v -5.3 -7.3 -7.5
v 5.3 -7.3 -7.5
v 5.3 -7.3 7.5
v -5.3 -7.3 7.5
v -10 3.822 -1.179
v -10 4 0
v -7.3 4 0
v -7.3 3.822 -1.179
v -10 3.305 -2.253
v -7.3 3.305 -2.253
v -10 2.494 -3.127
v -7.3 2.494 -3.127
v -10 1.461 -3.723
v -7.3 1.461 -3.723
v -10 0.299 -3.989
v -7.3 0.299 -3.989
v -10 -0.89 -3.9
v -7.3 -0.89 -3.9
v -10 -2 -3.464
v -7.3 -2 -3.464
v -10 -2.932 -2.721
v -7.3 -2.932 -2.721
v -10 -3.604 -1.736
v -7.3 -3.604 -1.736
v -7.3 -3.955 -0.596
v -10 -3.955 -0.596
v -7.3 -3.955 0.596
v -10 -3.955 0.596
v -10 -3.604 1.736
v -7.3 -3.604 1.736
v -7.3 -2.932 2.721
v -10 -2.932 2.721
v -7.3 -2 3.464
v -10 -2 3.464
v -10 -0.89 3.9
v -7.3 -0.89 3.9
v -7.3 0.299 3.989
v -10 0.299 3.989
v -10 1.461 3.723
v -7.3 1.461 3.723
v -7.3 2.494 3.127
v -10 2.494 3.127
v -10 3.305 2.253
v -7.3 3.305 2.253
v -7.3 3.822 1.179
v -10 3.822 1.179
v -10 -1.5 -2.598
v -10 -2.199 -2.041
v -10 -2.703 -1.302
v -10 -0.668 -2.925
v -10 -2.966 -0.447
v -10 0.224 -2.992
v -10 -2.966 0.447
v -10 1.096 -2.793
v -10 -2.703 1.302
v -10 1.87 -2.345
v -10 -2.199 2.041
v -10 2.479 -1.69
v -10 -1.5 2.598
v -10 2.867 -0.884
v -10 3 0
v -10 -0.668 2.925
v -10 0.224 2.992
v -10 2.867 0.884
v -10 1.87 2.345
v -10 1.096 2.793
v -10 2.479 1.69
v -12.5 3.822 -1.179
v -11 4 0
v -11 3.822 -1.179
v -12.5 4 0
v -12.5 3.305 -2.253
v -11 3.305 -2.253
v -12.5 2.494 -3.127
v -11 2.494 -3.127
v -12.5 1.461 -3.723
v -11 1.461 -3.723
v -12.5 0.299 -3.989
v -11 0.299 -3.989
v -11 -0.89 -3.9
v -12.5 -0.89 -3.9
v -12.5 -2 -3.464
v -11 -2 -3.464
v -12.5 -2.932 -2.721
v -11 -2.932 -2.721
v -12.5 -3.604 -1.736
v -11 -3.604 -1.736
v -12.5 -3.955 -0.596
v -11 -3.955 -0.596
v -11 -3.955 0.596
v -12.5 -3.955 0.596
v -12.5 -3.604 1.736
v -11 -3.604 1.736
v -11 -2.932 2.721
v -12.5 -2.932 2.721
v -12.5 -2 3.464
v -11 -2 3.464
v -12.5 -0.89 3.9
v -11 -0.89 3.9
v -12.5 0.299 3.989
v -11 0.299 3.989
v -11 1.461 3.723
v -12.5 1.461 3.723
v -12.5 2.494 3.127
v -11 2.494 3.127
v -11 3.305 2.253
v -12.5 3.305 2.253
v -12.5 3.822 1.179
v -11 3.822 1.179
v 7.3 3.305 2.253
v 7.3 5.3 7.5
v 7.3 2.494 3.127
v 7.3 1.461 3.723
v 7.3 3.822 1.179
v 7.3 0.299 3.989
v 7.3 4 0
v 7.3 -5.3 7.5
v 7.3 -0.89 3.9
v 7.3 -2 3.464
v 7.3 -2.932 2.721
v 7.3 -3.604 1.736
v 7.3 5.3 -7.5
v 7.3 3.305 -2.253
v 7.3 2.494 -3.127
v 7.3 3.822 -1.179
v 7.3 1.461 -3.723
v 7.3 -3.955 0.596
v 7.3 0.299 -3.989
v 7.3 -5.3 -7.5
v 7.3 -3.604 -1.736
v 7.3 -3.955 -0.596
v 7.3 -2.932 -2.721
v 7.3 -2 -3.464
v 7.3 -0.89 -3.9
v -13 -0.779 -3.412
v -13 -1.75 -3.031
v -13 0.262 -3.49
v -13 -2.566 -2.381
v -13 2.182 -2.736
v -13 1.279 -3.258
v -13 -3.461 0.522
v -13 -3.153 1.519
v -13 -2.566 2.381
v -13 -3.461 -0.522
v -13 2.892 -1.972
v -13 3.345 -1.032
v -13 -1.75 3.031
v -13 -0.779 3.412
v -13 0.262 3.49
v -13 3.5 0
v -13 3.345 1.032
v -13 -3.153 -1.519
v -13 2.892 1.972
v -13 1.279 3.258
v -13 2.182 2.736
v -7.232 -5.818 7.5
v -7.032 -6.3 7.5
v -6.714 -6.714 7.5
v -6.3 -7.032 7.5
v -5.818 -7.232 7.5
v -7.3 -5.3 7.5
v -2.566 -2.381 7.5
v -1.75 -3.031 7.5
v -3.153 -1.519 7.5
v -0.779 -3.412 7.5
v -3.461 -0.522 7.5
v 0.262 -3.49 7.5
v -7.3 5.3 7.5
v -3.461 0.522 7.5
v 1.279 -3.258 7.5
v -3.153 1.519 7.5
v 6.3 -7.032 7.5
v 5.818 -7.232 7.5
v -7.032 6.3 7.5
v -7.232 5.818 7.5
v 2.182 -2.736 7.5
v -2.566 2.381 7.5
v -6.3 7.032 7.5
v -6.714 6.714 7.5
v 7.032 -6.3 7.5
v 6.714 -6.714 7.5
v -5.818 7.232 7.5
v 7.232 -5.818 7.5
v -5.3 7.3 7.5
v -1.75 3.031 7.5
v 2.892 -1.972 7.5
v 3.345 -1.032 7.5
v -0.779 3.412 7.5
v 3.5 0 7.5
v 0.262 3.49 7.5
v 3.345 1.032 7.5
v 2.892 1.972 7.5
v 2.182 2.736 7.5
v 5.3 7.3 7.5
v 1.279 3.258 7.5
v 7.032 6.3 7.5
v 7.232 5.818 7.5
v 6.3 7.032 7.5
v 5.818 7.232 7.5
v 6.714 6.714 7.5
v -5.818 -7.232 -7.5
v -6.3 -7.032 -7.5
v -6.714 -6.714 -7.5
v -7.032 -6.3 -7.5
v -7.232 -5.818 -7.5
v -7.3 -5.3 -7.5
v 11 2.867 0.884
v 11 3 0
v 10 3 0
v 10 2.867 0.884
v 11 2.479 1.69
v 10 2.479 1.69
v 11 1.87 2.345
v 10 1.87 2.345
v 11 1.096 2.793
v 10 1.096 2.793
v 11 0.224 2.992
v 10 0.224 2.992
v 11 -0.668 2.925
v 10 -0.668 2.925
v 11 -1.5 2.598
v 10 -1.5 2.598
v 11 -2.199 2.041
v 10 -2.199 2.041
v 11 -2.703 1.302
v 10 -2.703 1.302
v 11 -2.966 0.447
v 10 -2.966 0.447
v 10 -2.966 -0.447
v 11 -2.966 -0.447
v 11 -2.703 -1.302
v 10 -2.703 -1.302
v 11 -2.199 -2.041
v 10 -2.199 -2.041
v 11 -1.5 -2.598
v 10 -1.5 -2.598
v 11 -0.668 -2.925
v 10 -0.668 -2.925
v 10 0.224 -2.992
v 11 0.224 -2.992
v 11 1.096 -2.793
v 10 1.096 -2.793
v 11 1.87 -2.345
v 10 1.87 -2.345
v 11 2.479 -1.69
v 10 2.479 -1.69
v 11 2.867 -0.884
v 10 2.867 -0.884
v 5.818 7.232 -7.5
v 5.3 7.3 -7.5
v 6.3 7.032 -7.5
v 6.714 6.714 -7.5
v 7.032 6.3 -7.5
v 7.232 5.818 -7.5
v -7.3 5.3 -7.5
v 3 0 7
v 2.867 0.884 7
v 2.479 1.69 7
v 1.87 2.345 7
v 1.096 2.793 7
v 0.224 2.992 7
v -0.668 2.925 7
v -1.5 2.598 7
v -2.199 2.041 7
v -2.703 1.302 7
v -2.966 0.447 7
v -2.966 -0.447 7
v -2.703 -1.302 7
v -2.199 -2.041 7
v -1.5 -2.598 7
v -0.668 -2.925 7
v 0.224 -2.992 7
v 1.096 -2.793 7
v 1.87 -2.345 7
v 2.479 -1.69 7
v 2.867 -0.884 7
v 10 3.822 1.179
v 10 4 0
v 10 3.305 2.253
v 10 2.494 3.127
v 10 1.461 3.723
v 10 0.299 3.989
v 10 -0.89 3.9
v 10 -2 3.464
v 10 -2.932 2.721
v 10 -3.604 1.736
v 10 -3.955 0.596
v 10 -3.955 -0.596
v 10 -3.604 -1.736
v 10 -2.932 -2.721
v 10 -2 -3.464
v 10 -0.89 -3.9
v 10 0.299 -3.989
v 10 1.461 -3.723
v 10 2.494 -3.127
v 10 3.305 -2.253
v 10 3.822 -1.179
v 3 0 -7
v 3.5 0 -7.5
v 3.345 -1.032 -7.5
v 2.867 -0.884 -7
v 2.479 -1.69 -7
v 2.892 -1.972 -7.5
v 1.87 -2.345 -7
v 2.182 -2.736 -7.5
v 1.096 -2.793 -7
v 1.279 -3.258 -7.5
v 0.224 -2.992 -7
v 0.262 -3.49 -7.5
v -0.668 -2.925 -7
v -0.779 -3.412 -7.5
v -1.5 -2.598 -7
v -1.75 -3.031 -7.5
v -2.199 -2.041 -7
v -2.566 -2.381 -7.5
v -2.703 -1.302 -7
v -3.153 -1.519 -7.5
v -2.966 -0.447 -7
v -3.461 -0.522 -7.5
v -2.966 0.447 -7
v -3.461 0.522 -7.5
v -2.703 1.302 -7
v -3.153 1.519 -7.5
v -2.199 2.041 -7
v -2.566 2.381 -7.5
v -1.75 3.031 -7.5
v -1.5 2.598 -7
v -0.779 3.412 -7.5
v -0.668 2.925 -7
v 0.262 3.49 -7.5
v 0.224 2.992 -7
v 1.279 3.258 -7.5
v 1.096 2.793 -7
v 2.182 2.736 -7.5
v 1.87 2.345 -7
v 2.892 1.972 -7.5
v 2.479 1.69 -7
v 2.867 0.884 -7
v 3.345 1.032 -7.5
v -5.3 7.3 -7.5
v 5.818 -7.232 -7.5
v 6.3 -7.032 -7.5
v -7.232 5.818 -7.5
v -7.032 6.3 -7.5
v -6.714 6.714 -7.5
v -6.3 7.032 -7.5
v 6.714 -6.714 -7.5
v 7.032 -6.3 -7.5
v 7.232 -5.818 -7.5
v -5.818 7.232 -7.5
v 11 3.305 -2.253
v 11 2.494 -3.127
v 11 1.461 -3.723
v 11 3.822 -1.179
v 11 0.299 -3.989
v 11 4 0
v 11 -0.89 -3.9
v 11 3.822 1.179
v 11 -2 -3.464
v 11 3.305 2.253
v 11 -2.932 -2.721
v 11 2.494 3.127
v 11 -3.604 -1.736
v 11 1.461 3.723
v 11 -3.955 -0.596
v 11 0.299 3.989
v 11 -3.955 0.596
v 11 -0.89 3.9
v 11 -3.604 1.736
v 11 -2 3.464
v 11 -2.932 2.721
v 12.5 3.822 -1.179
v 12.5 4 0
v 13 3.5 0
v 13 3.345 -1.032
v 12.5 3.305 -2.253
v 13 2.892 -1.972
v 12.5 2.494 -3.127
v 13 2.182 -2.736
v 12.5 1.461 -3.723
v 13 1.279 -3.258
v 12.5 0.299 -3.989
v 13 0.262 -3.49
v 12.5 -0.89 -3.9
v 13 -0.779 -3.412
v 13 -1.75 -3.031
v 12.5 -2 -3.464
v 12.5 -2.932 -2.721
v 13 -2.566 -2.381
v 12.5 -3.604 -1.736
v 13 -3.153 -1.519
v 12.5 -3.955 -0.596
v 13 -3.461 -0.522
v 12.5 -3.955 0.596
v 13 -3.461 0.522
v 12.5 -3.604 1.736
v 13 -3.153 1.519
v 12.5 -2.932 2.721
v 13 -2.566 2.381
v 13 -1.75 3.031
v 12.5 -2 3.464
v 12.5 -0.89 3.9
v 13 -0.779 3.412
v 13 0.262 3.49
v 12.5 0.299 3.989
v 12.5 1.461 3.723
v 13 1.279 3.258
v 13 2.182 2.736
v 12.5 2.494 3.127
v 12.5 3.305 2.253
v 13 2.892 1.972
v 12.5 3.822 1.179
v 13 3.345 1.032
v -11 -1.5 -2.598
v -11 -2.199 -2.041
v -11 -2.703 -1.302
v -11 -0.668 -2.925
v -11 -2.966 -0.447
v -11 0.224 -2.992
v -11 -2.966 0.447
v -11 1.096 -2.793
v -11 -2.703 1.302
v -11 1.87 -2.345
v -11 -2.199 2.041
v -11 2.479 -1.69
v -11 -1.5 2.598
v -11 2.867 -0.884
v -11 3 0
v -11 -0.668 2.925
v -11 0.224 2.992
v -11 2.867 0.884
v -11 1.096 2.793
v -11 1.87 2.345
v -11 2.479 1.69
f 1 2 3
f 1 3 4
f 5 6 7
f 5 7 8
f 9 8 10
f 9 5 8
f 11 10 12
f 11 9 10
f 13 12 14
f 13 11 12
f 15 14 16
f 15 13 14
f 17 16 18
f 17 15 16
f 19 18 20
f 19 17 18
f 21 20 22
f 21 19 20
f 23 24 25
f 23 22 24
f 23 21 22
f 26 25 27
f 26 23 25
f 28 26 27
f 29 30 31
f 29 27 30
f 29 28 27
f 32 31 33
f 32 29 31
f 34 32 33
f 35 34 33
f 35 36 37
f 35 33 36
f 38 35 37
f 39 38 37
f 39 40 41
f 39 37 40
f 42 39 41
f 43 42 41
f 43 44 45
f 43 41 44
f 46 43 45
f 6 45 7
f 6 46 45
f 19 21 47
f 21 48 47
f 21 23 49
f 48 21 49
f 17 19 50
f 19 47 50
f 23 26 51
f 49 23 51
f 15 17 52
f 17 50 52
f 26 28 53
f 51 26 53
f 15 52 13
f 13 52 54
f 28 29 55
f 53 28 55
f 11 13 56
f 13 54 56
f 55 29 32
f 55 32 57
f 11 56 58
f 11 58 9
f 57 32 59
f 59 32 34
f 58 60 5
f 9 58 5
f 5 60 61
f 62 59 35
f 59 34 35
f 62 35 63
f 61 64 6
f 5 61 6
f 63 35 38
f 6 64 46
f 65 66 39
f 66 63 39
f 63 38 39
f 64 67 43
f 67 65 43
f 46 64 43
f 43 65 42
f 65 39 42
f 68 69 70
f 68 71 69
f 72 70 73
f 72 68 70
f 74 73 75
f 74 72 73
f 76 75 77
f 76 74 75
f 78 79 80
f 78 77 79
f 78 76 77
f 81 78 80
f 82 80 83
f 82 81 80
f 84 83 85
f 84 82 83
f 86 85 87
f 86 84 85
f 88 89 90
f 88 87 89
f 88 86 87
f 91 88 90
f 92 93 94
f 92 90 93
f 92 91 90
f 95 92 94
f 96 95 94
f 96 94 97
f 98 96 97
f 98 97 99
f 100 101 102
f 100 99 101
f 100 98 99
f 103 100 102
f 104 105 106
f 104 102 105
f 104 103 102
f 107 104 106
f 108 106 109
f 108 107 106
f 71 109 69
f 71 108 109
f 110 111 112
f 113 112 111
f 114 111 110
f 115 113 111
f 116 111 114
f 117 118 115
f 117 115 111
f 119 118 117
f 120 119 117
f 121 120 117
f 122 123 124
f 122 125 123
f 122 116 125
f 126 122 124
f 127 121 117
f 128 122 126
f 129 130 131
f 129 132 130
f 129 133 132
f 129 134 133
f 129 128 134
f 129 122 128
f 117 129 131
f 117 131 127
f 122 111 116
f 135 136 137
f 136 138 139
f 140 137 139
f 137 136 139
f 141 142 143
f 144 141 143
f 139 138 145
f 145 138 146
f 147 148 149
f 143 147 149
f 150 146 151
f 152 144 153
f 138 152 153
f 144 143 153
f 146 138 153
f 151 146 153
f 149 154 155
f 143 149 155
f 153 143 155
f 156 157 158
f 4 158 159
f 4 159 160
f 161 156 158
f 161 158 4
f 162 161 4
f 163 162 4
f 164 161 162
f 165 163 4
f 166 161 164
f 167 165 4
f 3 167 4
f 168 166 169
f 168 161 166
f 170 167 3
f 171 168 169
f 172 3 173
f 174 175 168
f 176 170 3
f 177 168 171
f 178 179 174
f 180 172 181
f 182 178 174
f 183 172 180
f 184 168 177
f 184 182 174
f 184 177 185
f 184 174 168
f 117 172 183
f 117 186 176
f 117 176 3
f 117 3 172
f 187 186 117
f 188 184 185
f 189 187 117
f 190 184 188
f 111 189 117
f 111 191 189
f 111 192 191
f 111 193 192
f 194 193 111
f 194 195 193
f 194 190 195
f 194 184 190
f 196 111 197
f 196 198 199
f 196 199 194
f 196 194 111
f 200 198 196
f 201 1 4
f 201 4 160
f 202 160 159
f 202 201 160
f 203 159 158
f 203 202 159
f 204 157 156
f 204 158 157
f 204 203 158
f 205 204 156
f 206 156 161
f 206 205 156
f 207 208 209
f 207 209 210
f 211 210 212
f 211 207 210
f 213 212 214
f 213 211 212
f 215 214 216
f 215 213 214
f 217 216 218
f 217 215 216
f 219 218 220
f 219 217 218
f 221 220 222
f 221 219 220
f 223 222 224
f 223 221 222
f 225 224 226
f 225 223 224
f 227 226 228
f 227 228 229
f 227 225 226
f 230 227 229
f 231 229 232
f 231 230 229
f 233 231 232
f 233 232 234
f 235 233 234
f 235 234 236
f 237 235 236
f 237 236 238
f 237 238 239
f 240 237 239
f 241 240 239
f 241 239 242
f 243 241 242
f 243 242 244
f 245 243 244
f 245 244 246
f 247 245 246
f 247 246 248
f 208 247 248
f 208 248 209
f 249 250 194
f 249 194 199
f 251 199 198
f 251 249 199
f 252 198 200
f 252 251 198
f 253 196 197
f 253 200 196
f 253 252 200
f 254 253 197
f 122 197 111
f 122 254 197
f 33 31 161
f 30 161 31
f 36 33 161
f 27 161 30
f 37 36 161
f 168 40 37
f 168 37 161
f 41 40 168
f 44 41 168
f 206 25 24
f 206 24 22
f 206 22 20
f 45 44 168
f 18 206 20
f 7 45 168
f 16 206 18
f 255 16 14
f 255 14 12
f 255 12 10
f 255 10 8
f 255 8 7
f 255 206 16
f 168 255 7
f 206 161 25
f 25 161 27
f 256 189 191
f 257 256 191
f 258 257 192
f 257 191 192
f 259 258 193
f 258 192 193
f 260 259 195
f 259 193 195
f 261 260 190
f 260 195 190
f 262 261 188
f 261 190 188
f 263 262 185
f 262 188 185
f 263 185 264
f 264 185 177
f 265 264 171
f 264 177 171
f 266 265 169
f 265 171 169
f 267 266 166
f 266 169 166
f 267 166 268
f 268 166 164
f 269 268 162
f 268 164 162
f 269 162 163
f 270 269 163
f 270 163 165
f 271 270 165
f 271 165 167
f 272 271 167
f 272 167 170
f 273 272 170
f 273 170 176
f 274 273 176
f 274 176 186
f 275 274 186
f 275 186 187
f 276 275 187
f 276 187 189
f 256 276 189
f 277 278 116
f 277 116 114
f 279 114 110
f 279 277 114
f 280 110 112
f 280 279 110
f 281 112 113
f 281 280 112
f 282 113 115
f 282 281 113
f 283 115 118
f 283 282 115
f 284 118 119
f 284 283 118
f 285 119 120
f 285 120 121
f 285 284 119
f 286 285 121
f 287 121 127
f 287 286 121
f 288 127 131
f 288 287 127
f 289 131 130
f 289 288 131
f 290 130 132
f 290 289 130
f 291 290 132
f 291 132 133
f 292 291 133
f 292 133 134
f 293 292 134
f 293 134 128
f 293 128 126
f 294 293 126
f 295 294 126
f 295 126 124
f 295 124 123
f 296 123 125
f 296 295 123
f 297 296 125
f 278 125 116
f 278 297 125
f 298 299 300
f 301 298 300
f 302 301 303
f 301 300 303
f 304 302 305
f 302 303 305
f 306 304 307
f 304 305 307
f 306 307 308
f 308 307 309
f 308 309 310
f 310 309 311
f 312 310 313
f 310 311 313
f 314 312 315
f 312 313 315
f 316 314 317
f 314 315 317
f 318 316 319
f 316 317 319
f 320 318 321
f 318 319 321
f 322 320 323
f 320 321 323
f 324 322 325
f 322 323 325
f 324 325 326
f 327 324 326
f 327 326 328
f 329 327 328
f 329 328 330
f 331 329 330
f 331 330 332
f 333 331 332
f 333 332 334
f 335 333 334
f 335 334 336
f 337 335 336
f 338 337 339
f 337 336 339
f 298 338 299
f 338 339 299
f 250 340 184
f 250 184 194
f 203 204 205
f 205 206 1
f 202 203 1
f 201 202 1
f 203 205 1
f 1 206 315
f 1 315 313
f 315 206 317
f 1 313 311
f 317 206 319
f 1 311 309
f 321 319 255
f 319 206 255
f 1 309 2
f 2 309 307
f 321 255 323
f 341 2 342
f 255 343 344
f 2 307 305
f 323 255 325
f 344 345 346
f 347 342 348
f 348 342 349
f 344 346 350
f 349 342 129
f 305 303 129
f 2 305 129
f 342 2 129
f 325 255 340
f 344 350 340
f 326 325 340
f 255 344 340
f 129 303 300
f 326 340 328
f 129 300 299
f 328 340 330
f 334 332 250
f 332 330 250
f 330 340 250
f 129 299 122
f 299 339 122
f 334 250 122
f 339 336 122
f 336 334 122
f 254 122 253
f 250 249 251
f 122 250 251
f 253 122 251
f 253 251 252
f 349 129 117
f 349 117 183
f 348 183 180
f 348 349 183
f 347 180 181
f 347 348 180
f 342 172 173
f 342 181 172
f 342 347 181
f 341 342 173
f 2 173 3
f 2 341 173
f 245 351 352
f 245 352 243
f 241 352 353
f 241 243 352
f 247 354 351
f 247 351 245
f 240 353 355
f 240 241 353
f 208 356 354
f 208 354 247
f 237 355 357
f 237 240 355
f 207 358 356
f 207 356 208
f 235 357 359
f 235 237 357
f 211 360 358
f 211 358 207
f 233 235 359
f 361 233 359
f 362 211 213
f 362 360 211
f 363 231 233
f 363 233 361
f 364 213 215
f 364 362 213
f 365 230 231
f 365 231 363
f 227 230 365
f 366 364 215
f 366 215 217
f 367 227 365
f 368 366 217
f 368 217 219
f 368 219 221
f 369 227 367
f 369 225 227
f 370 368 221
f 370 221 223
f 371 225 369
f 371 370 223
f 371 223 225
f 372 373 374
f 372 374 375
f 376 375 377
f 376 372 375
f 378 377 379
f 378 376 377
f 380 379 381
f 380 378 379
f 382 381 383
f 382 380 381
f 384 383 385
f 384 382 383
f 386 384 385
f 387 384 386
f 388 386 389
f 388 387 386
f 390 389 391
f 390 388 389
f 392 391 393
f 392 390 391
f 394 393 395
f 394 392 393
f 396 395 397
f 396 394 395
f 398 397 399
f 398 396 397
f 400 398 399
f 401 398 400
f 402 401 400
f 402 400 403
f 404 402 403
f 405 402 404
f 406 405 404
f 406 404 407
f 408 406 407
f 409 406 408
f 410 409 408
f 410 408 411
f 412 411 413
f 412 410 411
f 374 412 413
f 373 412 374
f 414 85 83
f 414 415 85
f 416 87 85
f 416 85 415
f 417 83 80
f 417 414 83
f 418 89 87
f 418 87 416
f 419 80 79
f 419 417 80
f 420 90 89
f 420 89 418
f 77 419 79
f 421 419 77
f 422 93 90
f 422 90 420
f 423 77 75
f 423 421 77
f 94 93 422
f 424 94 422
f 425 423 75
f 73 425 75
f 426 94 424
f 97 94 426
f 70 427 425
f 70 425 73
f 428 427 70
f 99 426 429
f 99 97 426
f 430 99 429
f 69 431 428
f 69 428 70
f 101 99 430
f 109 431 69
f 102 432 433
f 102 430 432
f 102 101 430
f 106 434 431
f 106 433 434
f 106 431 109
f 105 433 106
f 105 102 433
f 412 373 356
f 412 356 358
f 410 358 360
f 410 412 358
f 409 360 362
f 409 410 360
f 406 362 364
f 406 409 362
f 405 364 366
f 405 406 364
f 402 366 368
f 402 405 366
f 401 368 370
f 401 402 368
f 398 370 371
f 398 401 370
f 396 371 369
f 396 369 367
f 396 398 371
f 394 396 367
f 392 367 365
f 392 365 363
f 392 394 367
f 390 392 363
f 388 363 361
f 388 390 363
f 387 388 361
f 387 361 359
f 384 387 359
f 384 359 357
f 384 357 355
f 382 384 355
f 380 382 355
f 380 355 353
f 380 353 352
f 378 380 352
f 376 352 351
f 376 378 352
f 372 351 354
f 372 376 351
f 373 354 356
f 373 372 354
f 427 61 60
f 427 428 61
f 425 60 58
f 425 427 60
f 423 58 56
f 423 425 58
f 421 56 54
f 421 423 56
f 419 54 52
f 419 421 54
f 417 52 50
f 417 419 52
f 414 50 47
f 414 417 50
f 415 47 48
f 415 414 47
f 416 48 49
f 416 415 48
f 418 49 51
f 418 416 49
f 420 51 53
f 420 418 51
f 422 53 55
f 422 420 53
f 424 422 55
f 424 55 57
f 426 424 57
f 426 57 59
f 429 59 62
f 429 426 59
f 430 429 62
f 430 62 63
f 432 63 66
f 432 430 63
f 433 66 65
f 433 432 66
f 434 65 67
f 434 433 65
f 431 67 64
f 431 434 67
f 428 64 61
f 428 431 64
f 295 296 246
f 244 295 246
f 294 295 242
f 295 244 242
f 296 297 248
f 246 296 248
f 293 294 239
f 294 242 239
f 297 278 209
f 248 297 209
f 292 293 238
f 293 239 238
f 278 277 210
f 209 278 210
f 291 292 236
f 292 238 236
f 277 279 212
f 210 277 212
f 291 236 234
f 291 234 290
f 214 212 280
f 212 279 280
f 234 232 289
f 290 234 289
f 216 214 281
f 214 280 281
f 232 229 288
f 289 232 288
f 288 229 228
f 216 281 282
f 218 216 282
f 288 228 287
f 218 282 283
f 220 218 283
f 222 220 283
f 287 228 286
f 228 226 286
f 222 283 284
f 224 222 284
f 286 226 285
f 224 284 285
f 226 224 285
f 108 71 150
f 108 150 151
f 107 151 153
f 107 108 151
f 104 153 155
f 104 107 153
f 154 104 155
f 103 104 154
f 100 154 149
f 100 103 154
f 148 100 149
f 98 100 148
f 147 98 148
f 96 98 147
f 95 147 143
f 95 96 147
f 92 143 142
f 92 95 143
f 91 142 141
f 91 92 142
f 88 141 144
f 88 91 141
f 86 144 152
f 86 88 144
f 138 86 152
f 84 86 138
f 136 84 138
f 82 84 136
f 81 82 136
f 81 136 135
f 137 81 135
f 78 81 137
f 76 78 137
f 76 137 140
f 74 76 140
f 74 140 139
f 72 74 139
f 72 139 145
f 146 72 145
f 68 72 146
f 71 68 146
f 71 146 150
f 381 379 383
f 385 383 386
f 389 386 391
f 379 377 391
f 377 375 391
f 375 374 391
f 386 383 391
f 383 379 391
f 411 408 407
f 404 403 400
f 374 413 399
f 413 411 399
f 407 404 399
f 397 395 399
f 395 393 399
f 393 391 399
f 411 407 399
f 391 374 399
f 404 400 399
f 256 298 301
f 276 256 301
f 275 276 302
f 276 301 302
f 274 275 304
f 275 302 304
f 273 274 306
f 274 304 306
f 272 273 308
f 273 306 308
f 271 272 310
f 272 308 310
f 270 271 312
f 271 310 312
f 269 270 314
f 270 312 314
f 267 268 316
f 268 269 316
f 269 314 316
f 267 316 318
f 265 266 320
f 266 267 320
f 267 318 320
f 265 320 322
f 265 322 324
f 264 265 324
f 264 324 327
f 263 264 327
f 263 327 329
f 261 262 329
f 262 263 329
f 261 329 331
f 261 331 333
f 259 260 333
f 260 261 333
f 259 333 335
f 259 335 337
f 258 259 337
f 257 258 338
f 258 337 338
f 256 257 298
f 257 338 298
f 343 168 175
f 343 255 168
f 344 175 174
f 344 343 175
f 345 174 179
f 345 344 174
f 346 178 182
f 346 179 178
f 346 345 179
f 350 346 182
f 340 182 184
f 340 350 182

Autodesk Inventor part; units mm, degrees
ref_plane "YZ Plane" through (0, 0, 0) normal (1, 0, 0) x (0, 1, 0)
ref_plane "XZ Plane" through (0, 0, 0) normal (0, 1, 0) x (-1, 0, 0)
ref_plane "XY Plane" through (0, 0, 0) normal (0, 0, 1) x (1, 0, 0)
sketch "Sketch1" plane through (0, 0, 0) normal (0, 0, 1) x (1, 0, 0)
  line L0 (-5.3, 7.3) -> (5.3, 7.3)
  line L1 (7.3, 5.3) -> (7.3, -5.3)
  line L2 (5.3, -7.3) -> (-5.3, -7.3)
  line L3 (-7.3, -5.3) -> (-7.3, 5.3)
  arc A0 (-5.3, 7.3) -> (-7.3, 5.3) centre (-5.3, 5.3) ccw
  arc A1 (7.3, 5.3) -> (5.3, 7.3) centre (5.3, 5.3) ccw
  arc A2 (5.3, -7.3) -> (7.3, -5.3) centre (5.3, -5.3) ccw
  arc A3 (-7.3, -5.3) -> (-5.3, -7.3) centre (-5.3, -5.3) ccw
  line L4 (-7.3, 4) -> (-10, 4)
  line L5 (-10, 4) -> (-10, 3)
  line L6 (-10, 3) -> (-11, 3)
  line L7 (-11, 3) -> (-11, 4)
  line L8 (-11, 4) -> (-13, 4)
  line L9 (-13, 4) -> (-13, 0)
  line L10 (-13, 0) -> (-7.3, 0)
  circle A4 centre (0, 0) radius 3
  point P0 (0, 7.3)
  point P1 (7.3, 0)
  dimension "d0" = 14.6
  dimension "d1" = 2
  dimension "d3" = 8
  dimension "d4" = 6
  dimension "d5" = 2
  dimension "d6" = 1
  dimension "d7" = 13
  dimension "d11" = 6
extrude "Extrusion1" add sketch "Sketch1" along normal mid plane 15 contours L0 A1 L1 A2 L2 A3 L3 A0
revolve "Revolution1" add sketch "Sketch1" angle 360 about axis through (-13, 0, 0) along (1, 0, 0) contours L3 L10 L9 L8 L7 L6 L5 L4
mirror "Mirror1" about plane through (0, 0, 0) normal (1, 0, 0) of "Revolution1"
chamfer "Chamfer1" distance 0.5 angle 45 4 edges at (13, -4, 0) (-13, -4, 0) (-3, 0, 7.5) (-3, 0, -7.5)
properties part number "Tee" material "Steel, Mild"
